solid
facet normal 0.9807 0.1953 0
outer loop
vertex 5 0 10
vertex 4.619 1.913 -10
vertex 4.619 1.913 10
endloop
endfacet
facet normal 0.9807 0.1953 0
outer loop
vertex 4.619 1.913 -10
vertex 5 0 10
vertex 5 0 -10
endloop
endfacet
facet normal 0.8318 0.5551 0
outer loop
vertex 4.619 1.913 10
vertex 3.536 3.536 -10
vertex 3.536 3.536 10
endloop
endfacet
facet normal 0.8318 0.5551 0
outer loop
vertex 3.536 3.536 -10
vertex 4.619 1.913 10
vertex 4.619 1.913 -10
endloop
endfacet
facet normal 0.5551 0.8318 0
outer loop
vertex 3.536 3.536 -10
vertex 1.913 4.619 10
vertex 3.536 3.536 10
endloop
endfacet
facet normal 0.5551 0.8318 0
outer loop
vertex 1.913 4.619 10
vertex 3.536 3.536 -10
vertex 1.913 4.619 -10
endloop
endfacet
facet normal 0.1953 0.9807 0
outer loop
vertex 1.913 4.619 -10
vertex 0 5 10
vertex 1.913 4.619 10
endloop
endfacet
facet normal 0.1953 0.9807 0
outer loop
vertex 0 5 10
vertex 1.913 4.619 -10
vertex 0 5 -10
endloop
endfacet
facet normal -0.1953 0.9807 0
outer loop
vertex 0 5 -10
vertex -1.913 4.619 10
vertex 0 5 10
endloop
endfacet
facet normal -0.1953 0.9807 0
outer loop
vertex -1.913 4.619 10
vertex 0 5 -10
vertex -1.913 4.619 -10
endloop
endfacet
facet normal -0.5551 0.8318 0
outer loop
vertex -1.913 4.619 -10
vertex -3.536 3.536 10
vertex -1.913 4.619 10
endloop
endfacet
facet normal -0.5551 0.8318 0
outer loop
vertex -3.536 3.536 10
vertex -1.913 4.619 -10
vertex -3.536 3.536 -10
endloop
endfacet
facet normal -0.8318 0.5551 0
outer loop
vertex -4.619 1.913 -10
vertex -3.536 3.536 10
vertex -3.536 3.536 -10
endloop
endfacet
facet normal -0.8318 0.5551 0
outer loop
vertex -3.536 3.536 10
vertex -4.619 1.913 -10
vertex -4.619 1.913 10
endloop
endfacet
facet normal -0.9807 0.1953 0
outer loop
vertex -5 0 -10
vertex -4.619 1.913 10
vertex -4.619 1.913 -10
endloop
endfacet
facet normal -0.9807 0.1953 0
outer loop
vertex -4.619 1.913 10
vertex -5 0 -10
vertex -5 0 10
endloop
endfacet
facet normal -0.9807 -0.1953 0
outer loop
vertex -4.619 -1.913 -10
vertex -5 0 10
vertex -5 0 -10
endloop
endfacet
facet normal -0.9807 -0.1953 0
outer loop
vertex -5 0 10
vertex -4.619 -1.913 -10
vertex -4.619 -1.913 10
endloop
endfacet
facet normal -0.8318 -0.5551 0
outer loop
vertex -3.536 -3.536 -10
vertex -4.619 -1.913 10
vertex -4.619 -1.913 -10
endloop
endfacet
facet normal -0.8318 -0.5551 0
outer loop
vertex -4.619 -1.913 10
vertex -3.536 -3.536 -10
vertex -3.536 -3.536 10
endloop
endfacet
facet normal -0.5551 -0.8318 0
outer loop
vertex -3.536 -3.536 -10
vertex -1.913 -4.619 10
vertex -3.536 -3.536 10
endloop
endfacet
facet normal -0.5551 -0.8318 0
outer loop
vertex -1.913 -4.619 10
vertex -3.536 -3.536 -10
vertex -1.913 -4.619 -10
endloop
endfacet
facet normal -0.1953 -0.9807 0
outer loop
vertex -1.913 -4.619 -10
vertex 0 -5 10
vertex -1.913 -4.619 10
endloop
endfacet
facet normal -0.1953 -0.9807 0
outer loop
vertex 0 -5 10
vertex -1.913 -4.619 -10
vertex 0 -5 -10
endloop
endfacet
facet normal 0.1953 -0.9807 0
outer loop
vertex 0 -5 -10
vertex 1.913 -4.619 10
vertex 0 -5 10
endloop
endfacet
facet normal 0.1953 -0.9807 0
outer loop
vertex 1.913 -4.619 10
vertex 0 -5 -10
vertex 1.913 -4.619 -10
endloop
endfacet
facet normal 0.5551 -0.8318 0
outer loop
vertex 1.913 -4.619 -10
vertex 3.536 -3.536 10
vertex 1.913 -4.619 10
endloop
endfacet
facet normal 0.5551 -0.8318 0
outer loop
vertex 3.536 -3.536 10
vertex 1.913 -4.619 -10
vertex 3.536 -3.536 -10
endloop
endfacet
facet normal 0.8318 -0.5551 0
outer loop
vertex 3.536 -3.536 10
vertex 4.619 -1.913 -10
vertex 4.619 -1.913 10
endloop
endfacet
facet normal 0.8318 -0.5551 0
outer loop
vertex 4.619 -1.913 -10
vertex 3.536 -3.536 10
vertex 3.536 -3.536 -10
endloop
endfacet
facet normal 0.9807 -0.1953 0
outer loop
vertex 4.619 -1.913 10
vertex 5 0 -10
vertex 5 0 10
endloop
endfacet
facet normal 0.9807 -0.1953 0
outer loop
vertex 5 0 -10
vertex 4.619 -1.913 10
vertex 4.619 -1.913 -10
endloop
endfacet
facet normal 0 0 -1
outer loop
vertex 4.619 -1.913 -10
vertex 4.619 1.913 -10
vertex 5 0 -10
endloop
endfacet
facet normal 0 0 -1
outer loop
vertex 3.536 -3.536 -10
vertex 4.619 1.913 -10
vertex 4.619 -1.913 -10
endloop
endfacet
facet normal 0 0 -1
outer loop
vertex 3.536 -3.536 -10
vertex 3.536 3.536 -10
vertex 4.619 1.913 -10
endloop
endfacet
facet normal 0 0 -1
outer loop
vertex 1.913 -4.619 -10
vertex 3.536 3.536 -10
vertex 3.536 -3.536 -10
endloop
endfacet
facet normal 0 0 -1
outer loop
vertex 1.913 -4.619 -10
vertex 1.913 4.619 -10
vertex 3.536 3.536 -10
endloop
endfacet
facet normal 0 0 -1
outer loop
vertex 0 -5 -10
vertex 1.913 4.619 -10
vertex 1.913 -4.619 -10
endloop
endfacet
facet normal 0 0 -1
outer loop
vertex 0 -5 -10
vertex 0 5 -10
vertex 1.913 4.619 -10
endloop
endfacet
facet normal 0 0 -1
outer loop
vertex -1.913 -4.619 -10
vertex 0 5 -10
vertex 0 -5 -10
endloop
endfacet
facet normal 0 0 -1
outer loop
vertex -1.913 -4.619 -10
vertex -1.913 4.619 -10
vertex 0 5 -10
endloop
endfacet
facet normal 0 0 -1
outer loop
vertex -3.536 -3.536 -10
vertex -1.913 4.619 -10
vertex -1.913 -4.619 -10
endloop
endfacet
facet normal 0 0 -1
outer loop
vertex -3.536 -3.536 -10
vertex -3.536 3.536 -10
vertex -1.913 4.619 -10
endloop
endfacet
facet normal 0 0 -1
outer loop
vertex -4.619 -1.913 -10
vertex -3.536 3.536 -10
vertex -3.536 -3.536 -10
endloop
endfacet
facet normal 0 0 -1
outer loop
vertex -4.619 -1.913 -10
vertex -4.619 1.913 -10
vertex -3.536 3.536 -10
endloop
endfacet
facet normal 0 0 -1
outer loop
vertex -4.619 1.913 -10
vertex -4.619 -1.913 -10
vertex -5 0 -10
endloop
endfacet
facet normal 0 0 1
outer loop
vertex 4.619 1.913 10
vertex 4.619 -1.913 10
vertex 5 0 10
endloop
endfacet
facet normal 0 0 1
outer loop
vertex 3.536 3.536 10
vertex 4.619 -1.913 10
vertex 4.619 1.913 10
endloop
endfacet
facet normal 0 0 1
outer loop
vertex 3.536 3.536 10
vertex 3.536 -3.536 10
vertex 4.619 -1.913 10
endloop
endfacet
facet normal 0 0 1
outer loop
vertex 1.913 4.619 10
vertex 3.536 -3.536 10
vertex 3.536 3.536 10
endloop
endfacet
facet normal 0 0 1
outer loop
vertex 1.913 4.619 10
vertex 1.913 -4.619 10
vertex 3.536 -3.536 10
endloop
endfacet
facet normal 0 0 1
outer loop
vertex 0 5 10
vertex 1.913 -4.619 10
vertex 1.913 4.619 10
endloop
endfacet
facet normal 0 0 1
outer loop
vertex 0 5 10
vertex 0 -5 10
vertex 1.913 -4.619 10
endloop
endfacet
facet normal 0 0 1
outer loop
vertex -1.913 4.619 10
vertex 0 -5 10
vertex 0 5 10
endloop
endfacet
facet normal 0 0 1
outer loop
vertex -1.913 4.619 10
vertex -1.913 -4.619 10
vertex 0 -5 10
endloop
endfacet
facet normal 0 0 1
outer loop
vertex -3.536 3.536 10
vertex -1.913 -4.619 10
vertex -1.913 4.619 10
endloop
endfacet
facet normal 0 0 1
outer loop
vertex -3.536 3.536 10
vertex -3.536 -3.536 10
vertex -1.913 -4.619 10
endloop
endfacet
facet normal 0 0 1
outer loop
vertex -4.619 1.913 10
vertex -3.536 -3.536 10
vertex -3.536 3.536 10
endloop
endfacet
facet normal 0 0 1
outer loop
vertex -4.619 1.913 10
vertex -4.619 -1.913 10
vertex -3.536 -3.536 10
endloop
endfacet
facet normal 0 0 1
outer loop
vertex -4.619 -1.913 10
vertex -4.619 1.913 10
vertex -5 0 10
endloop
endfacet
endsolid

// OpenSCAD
// param: radius=5, height=20
module param_cylinder(radius=5, height=20) {
    cylinder(r=radius, h=height, center=true);
}
param_cylinder(radius=5, height=20);
